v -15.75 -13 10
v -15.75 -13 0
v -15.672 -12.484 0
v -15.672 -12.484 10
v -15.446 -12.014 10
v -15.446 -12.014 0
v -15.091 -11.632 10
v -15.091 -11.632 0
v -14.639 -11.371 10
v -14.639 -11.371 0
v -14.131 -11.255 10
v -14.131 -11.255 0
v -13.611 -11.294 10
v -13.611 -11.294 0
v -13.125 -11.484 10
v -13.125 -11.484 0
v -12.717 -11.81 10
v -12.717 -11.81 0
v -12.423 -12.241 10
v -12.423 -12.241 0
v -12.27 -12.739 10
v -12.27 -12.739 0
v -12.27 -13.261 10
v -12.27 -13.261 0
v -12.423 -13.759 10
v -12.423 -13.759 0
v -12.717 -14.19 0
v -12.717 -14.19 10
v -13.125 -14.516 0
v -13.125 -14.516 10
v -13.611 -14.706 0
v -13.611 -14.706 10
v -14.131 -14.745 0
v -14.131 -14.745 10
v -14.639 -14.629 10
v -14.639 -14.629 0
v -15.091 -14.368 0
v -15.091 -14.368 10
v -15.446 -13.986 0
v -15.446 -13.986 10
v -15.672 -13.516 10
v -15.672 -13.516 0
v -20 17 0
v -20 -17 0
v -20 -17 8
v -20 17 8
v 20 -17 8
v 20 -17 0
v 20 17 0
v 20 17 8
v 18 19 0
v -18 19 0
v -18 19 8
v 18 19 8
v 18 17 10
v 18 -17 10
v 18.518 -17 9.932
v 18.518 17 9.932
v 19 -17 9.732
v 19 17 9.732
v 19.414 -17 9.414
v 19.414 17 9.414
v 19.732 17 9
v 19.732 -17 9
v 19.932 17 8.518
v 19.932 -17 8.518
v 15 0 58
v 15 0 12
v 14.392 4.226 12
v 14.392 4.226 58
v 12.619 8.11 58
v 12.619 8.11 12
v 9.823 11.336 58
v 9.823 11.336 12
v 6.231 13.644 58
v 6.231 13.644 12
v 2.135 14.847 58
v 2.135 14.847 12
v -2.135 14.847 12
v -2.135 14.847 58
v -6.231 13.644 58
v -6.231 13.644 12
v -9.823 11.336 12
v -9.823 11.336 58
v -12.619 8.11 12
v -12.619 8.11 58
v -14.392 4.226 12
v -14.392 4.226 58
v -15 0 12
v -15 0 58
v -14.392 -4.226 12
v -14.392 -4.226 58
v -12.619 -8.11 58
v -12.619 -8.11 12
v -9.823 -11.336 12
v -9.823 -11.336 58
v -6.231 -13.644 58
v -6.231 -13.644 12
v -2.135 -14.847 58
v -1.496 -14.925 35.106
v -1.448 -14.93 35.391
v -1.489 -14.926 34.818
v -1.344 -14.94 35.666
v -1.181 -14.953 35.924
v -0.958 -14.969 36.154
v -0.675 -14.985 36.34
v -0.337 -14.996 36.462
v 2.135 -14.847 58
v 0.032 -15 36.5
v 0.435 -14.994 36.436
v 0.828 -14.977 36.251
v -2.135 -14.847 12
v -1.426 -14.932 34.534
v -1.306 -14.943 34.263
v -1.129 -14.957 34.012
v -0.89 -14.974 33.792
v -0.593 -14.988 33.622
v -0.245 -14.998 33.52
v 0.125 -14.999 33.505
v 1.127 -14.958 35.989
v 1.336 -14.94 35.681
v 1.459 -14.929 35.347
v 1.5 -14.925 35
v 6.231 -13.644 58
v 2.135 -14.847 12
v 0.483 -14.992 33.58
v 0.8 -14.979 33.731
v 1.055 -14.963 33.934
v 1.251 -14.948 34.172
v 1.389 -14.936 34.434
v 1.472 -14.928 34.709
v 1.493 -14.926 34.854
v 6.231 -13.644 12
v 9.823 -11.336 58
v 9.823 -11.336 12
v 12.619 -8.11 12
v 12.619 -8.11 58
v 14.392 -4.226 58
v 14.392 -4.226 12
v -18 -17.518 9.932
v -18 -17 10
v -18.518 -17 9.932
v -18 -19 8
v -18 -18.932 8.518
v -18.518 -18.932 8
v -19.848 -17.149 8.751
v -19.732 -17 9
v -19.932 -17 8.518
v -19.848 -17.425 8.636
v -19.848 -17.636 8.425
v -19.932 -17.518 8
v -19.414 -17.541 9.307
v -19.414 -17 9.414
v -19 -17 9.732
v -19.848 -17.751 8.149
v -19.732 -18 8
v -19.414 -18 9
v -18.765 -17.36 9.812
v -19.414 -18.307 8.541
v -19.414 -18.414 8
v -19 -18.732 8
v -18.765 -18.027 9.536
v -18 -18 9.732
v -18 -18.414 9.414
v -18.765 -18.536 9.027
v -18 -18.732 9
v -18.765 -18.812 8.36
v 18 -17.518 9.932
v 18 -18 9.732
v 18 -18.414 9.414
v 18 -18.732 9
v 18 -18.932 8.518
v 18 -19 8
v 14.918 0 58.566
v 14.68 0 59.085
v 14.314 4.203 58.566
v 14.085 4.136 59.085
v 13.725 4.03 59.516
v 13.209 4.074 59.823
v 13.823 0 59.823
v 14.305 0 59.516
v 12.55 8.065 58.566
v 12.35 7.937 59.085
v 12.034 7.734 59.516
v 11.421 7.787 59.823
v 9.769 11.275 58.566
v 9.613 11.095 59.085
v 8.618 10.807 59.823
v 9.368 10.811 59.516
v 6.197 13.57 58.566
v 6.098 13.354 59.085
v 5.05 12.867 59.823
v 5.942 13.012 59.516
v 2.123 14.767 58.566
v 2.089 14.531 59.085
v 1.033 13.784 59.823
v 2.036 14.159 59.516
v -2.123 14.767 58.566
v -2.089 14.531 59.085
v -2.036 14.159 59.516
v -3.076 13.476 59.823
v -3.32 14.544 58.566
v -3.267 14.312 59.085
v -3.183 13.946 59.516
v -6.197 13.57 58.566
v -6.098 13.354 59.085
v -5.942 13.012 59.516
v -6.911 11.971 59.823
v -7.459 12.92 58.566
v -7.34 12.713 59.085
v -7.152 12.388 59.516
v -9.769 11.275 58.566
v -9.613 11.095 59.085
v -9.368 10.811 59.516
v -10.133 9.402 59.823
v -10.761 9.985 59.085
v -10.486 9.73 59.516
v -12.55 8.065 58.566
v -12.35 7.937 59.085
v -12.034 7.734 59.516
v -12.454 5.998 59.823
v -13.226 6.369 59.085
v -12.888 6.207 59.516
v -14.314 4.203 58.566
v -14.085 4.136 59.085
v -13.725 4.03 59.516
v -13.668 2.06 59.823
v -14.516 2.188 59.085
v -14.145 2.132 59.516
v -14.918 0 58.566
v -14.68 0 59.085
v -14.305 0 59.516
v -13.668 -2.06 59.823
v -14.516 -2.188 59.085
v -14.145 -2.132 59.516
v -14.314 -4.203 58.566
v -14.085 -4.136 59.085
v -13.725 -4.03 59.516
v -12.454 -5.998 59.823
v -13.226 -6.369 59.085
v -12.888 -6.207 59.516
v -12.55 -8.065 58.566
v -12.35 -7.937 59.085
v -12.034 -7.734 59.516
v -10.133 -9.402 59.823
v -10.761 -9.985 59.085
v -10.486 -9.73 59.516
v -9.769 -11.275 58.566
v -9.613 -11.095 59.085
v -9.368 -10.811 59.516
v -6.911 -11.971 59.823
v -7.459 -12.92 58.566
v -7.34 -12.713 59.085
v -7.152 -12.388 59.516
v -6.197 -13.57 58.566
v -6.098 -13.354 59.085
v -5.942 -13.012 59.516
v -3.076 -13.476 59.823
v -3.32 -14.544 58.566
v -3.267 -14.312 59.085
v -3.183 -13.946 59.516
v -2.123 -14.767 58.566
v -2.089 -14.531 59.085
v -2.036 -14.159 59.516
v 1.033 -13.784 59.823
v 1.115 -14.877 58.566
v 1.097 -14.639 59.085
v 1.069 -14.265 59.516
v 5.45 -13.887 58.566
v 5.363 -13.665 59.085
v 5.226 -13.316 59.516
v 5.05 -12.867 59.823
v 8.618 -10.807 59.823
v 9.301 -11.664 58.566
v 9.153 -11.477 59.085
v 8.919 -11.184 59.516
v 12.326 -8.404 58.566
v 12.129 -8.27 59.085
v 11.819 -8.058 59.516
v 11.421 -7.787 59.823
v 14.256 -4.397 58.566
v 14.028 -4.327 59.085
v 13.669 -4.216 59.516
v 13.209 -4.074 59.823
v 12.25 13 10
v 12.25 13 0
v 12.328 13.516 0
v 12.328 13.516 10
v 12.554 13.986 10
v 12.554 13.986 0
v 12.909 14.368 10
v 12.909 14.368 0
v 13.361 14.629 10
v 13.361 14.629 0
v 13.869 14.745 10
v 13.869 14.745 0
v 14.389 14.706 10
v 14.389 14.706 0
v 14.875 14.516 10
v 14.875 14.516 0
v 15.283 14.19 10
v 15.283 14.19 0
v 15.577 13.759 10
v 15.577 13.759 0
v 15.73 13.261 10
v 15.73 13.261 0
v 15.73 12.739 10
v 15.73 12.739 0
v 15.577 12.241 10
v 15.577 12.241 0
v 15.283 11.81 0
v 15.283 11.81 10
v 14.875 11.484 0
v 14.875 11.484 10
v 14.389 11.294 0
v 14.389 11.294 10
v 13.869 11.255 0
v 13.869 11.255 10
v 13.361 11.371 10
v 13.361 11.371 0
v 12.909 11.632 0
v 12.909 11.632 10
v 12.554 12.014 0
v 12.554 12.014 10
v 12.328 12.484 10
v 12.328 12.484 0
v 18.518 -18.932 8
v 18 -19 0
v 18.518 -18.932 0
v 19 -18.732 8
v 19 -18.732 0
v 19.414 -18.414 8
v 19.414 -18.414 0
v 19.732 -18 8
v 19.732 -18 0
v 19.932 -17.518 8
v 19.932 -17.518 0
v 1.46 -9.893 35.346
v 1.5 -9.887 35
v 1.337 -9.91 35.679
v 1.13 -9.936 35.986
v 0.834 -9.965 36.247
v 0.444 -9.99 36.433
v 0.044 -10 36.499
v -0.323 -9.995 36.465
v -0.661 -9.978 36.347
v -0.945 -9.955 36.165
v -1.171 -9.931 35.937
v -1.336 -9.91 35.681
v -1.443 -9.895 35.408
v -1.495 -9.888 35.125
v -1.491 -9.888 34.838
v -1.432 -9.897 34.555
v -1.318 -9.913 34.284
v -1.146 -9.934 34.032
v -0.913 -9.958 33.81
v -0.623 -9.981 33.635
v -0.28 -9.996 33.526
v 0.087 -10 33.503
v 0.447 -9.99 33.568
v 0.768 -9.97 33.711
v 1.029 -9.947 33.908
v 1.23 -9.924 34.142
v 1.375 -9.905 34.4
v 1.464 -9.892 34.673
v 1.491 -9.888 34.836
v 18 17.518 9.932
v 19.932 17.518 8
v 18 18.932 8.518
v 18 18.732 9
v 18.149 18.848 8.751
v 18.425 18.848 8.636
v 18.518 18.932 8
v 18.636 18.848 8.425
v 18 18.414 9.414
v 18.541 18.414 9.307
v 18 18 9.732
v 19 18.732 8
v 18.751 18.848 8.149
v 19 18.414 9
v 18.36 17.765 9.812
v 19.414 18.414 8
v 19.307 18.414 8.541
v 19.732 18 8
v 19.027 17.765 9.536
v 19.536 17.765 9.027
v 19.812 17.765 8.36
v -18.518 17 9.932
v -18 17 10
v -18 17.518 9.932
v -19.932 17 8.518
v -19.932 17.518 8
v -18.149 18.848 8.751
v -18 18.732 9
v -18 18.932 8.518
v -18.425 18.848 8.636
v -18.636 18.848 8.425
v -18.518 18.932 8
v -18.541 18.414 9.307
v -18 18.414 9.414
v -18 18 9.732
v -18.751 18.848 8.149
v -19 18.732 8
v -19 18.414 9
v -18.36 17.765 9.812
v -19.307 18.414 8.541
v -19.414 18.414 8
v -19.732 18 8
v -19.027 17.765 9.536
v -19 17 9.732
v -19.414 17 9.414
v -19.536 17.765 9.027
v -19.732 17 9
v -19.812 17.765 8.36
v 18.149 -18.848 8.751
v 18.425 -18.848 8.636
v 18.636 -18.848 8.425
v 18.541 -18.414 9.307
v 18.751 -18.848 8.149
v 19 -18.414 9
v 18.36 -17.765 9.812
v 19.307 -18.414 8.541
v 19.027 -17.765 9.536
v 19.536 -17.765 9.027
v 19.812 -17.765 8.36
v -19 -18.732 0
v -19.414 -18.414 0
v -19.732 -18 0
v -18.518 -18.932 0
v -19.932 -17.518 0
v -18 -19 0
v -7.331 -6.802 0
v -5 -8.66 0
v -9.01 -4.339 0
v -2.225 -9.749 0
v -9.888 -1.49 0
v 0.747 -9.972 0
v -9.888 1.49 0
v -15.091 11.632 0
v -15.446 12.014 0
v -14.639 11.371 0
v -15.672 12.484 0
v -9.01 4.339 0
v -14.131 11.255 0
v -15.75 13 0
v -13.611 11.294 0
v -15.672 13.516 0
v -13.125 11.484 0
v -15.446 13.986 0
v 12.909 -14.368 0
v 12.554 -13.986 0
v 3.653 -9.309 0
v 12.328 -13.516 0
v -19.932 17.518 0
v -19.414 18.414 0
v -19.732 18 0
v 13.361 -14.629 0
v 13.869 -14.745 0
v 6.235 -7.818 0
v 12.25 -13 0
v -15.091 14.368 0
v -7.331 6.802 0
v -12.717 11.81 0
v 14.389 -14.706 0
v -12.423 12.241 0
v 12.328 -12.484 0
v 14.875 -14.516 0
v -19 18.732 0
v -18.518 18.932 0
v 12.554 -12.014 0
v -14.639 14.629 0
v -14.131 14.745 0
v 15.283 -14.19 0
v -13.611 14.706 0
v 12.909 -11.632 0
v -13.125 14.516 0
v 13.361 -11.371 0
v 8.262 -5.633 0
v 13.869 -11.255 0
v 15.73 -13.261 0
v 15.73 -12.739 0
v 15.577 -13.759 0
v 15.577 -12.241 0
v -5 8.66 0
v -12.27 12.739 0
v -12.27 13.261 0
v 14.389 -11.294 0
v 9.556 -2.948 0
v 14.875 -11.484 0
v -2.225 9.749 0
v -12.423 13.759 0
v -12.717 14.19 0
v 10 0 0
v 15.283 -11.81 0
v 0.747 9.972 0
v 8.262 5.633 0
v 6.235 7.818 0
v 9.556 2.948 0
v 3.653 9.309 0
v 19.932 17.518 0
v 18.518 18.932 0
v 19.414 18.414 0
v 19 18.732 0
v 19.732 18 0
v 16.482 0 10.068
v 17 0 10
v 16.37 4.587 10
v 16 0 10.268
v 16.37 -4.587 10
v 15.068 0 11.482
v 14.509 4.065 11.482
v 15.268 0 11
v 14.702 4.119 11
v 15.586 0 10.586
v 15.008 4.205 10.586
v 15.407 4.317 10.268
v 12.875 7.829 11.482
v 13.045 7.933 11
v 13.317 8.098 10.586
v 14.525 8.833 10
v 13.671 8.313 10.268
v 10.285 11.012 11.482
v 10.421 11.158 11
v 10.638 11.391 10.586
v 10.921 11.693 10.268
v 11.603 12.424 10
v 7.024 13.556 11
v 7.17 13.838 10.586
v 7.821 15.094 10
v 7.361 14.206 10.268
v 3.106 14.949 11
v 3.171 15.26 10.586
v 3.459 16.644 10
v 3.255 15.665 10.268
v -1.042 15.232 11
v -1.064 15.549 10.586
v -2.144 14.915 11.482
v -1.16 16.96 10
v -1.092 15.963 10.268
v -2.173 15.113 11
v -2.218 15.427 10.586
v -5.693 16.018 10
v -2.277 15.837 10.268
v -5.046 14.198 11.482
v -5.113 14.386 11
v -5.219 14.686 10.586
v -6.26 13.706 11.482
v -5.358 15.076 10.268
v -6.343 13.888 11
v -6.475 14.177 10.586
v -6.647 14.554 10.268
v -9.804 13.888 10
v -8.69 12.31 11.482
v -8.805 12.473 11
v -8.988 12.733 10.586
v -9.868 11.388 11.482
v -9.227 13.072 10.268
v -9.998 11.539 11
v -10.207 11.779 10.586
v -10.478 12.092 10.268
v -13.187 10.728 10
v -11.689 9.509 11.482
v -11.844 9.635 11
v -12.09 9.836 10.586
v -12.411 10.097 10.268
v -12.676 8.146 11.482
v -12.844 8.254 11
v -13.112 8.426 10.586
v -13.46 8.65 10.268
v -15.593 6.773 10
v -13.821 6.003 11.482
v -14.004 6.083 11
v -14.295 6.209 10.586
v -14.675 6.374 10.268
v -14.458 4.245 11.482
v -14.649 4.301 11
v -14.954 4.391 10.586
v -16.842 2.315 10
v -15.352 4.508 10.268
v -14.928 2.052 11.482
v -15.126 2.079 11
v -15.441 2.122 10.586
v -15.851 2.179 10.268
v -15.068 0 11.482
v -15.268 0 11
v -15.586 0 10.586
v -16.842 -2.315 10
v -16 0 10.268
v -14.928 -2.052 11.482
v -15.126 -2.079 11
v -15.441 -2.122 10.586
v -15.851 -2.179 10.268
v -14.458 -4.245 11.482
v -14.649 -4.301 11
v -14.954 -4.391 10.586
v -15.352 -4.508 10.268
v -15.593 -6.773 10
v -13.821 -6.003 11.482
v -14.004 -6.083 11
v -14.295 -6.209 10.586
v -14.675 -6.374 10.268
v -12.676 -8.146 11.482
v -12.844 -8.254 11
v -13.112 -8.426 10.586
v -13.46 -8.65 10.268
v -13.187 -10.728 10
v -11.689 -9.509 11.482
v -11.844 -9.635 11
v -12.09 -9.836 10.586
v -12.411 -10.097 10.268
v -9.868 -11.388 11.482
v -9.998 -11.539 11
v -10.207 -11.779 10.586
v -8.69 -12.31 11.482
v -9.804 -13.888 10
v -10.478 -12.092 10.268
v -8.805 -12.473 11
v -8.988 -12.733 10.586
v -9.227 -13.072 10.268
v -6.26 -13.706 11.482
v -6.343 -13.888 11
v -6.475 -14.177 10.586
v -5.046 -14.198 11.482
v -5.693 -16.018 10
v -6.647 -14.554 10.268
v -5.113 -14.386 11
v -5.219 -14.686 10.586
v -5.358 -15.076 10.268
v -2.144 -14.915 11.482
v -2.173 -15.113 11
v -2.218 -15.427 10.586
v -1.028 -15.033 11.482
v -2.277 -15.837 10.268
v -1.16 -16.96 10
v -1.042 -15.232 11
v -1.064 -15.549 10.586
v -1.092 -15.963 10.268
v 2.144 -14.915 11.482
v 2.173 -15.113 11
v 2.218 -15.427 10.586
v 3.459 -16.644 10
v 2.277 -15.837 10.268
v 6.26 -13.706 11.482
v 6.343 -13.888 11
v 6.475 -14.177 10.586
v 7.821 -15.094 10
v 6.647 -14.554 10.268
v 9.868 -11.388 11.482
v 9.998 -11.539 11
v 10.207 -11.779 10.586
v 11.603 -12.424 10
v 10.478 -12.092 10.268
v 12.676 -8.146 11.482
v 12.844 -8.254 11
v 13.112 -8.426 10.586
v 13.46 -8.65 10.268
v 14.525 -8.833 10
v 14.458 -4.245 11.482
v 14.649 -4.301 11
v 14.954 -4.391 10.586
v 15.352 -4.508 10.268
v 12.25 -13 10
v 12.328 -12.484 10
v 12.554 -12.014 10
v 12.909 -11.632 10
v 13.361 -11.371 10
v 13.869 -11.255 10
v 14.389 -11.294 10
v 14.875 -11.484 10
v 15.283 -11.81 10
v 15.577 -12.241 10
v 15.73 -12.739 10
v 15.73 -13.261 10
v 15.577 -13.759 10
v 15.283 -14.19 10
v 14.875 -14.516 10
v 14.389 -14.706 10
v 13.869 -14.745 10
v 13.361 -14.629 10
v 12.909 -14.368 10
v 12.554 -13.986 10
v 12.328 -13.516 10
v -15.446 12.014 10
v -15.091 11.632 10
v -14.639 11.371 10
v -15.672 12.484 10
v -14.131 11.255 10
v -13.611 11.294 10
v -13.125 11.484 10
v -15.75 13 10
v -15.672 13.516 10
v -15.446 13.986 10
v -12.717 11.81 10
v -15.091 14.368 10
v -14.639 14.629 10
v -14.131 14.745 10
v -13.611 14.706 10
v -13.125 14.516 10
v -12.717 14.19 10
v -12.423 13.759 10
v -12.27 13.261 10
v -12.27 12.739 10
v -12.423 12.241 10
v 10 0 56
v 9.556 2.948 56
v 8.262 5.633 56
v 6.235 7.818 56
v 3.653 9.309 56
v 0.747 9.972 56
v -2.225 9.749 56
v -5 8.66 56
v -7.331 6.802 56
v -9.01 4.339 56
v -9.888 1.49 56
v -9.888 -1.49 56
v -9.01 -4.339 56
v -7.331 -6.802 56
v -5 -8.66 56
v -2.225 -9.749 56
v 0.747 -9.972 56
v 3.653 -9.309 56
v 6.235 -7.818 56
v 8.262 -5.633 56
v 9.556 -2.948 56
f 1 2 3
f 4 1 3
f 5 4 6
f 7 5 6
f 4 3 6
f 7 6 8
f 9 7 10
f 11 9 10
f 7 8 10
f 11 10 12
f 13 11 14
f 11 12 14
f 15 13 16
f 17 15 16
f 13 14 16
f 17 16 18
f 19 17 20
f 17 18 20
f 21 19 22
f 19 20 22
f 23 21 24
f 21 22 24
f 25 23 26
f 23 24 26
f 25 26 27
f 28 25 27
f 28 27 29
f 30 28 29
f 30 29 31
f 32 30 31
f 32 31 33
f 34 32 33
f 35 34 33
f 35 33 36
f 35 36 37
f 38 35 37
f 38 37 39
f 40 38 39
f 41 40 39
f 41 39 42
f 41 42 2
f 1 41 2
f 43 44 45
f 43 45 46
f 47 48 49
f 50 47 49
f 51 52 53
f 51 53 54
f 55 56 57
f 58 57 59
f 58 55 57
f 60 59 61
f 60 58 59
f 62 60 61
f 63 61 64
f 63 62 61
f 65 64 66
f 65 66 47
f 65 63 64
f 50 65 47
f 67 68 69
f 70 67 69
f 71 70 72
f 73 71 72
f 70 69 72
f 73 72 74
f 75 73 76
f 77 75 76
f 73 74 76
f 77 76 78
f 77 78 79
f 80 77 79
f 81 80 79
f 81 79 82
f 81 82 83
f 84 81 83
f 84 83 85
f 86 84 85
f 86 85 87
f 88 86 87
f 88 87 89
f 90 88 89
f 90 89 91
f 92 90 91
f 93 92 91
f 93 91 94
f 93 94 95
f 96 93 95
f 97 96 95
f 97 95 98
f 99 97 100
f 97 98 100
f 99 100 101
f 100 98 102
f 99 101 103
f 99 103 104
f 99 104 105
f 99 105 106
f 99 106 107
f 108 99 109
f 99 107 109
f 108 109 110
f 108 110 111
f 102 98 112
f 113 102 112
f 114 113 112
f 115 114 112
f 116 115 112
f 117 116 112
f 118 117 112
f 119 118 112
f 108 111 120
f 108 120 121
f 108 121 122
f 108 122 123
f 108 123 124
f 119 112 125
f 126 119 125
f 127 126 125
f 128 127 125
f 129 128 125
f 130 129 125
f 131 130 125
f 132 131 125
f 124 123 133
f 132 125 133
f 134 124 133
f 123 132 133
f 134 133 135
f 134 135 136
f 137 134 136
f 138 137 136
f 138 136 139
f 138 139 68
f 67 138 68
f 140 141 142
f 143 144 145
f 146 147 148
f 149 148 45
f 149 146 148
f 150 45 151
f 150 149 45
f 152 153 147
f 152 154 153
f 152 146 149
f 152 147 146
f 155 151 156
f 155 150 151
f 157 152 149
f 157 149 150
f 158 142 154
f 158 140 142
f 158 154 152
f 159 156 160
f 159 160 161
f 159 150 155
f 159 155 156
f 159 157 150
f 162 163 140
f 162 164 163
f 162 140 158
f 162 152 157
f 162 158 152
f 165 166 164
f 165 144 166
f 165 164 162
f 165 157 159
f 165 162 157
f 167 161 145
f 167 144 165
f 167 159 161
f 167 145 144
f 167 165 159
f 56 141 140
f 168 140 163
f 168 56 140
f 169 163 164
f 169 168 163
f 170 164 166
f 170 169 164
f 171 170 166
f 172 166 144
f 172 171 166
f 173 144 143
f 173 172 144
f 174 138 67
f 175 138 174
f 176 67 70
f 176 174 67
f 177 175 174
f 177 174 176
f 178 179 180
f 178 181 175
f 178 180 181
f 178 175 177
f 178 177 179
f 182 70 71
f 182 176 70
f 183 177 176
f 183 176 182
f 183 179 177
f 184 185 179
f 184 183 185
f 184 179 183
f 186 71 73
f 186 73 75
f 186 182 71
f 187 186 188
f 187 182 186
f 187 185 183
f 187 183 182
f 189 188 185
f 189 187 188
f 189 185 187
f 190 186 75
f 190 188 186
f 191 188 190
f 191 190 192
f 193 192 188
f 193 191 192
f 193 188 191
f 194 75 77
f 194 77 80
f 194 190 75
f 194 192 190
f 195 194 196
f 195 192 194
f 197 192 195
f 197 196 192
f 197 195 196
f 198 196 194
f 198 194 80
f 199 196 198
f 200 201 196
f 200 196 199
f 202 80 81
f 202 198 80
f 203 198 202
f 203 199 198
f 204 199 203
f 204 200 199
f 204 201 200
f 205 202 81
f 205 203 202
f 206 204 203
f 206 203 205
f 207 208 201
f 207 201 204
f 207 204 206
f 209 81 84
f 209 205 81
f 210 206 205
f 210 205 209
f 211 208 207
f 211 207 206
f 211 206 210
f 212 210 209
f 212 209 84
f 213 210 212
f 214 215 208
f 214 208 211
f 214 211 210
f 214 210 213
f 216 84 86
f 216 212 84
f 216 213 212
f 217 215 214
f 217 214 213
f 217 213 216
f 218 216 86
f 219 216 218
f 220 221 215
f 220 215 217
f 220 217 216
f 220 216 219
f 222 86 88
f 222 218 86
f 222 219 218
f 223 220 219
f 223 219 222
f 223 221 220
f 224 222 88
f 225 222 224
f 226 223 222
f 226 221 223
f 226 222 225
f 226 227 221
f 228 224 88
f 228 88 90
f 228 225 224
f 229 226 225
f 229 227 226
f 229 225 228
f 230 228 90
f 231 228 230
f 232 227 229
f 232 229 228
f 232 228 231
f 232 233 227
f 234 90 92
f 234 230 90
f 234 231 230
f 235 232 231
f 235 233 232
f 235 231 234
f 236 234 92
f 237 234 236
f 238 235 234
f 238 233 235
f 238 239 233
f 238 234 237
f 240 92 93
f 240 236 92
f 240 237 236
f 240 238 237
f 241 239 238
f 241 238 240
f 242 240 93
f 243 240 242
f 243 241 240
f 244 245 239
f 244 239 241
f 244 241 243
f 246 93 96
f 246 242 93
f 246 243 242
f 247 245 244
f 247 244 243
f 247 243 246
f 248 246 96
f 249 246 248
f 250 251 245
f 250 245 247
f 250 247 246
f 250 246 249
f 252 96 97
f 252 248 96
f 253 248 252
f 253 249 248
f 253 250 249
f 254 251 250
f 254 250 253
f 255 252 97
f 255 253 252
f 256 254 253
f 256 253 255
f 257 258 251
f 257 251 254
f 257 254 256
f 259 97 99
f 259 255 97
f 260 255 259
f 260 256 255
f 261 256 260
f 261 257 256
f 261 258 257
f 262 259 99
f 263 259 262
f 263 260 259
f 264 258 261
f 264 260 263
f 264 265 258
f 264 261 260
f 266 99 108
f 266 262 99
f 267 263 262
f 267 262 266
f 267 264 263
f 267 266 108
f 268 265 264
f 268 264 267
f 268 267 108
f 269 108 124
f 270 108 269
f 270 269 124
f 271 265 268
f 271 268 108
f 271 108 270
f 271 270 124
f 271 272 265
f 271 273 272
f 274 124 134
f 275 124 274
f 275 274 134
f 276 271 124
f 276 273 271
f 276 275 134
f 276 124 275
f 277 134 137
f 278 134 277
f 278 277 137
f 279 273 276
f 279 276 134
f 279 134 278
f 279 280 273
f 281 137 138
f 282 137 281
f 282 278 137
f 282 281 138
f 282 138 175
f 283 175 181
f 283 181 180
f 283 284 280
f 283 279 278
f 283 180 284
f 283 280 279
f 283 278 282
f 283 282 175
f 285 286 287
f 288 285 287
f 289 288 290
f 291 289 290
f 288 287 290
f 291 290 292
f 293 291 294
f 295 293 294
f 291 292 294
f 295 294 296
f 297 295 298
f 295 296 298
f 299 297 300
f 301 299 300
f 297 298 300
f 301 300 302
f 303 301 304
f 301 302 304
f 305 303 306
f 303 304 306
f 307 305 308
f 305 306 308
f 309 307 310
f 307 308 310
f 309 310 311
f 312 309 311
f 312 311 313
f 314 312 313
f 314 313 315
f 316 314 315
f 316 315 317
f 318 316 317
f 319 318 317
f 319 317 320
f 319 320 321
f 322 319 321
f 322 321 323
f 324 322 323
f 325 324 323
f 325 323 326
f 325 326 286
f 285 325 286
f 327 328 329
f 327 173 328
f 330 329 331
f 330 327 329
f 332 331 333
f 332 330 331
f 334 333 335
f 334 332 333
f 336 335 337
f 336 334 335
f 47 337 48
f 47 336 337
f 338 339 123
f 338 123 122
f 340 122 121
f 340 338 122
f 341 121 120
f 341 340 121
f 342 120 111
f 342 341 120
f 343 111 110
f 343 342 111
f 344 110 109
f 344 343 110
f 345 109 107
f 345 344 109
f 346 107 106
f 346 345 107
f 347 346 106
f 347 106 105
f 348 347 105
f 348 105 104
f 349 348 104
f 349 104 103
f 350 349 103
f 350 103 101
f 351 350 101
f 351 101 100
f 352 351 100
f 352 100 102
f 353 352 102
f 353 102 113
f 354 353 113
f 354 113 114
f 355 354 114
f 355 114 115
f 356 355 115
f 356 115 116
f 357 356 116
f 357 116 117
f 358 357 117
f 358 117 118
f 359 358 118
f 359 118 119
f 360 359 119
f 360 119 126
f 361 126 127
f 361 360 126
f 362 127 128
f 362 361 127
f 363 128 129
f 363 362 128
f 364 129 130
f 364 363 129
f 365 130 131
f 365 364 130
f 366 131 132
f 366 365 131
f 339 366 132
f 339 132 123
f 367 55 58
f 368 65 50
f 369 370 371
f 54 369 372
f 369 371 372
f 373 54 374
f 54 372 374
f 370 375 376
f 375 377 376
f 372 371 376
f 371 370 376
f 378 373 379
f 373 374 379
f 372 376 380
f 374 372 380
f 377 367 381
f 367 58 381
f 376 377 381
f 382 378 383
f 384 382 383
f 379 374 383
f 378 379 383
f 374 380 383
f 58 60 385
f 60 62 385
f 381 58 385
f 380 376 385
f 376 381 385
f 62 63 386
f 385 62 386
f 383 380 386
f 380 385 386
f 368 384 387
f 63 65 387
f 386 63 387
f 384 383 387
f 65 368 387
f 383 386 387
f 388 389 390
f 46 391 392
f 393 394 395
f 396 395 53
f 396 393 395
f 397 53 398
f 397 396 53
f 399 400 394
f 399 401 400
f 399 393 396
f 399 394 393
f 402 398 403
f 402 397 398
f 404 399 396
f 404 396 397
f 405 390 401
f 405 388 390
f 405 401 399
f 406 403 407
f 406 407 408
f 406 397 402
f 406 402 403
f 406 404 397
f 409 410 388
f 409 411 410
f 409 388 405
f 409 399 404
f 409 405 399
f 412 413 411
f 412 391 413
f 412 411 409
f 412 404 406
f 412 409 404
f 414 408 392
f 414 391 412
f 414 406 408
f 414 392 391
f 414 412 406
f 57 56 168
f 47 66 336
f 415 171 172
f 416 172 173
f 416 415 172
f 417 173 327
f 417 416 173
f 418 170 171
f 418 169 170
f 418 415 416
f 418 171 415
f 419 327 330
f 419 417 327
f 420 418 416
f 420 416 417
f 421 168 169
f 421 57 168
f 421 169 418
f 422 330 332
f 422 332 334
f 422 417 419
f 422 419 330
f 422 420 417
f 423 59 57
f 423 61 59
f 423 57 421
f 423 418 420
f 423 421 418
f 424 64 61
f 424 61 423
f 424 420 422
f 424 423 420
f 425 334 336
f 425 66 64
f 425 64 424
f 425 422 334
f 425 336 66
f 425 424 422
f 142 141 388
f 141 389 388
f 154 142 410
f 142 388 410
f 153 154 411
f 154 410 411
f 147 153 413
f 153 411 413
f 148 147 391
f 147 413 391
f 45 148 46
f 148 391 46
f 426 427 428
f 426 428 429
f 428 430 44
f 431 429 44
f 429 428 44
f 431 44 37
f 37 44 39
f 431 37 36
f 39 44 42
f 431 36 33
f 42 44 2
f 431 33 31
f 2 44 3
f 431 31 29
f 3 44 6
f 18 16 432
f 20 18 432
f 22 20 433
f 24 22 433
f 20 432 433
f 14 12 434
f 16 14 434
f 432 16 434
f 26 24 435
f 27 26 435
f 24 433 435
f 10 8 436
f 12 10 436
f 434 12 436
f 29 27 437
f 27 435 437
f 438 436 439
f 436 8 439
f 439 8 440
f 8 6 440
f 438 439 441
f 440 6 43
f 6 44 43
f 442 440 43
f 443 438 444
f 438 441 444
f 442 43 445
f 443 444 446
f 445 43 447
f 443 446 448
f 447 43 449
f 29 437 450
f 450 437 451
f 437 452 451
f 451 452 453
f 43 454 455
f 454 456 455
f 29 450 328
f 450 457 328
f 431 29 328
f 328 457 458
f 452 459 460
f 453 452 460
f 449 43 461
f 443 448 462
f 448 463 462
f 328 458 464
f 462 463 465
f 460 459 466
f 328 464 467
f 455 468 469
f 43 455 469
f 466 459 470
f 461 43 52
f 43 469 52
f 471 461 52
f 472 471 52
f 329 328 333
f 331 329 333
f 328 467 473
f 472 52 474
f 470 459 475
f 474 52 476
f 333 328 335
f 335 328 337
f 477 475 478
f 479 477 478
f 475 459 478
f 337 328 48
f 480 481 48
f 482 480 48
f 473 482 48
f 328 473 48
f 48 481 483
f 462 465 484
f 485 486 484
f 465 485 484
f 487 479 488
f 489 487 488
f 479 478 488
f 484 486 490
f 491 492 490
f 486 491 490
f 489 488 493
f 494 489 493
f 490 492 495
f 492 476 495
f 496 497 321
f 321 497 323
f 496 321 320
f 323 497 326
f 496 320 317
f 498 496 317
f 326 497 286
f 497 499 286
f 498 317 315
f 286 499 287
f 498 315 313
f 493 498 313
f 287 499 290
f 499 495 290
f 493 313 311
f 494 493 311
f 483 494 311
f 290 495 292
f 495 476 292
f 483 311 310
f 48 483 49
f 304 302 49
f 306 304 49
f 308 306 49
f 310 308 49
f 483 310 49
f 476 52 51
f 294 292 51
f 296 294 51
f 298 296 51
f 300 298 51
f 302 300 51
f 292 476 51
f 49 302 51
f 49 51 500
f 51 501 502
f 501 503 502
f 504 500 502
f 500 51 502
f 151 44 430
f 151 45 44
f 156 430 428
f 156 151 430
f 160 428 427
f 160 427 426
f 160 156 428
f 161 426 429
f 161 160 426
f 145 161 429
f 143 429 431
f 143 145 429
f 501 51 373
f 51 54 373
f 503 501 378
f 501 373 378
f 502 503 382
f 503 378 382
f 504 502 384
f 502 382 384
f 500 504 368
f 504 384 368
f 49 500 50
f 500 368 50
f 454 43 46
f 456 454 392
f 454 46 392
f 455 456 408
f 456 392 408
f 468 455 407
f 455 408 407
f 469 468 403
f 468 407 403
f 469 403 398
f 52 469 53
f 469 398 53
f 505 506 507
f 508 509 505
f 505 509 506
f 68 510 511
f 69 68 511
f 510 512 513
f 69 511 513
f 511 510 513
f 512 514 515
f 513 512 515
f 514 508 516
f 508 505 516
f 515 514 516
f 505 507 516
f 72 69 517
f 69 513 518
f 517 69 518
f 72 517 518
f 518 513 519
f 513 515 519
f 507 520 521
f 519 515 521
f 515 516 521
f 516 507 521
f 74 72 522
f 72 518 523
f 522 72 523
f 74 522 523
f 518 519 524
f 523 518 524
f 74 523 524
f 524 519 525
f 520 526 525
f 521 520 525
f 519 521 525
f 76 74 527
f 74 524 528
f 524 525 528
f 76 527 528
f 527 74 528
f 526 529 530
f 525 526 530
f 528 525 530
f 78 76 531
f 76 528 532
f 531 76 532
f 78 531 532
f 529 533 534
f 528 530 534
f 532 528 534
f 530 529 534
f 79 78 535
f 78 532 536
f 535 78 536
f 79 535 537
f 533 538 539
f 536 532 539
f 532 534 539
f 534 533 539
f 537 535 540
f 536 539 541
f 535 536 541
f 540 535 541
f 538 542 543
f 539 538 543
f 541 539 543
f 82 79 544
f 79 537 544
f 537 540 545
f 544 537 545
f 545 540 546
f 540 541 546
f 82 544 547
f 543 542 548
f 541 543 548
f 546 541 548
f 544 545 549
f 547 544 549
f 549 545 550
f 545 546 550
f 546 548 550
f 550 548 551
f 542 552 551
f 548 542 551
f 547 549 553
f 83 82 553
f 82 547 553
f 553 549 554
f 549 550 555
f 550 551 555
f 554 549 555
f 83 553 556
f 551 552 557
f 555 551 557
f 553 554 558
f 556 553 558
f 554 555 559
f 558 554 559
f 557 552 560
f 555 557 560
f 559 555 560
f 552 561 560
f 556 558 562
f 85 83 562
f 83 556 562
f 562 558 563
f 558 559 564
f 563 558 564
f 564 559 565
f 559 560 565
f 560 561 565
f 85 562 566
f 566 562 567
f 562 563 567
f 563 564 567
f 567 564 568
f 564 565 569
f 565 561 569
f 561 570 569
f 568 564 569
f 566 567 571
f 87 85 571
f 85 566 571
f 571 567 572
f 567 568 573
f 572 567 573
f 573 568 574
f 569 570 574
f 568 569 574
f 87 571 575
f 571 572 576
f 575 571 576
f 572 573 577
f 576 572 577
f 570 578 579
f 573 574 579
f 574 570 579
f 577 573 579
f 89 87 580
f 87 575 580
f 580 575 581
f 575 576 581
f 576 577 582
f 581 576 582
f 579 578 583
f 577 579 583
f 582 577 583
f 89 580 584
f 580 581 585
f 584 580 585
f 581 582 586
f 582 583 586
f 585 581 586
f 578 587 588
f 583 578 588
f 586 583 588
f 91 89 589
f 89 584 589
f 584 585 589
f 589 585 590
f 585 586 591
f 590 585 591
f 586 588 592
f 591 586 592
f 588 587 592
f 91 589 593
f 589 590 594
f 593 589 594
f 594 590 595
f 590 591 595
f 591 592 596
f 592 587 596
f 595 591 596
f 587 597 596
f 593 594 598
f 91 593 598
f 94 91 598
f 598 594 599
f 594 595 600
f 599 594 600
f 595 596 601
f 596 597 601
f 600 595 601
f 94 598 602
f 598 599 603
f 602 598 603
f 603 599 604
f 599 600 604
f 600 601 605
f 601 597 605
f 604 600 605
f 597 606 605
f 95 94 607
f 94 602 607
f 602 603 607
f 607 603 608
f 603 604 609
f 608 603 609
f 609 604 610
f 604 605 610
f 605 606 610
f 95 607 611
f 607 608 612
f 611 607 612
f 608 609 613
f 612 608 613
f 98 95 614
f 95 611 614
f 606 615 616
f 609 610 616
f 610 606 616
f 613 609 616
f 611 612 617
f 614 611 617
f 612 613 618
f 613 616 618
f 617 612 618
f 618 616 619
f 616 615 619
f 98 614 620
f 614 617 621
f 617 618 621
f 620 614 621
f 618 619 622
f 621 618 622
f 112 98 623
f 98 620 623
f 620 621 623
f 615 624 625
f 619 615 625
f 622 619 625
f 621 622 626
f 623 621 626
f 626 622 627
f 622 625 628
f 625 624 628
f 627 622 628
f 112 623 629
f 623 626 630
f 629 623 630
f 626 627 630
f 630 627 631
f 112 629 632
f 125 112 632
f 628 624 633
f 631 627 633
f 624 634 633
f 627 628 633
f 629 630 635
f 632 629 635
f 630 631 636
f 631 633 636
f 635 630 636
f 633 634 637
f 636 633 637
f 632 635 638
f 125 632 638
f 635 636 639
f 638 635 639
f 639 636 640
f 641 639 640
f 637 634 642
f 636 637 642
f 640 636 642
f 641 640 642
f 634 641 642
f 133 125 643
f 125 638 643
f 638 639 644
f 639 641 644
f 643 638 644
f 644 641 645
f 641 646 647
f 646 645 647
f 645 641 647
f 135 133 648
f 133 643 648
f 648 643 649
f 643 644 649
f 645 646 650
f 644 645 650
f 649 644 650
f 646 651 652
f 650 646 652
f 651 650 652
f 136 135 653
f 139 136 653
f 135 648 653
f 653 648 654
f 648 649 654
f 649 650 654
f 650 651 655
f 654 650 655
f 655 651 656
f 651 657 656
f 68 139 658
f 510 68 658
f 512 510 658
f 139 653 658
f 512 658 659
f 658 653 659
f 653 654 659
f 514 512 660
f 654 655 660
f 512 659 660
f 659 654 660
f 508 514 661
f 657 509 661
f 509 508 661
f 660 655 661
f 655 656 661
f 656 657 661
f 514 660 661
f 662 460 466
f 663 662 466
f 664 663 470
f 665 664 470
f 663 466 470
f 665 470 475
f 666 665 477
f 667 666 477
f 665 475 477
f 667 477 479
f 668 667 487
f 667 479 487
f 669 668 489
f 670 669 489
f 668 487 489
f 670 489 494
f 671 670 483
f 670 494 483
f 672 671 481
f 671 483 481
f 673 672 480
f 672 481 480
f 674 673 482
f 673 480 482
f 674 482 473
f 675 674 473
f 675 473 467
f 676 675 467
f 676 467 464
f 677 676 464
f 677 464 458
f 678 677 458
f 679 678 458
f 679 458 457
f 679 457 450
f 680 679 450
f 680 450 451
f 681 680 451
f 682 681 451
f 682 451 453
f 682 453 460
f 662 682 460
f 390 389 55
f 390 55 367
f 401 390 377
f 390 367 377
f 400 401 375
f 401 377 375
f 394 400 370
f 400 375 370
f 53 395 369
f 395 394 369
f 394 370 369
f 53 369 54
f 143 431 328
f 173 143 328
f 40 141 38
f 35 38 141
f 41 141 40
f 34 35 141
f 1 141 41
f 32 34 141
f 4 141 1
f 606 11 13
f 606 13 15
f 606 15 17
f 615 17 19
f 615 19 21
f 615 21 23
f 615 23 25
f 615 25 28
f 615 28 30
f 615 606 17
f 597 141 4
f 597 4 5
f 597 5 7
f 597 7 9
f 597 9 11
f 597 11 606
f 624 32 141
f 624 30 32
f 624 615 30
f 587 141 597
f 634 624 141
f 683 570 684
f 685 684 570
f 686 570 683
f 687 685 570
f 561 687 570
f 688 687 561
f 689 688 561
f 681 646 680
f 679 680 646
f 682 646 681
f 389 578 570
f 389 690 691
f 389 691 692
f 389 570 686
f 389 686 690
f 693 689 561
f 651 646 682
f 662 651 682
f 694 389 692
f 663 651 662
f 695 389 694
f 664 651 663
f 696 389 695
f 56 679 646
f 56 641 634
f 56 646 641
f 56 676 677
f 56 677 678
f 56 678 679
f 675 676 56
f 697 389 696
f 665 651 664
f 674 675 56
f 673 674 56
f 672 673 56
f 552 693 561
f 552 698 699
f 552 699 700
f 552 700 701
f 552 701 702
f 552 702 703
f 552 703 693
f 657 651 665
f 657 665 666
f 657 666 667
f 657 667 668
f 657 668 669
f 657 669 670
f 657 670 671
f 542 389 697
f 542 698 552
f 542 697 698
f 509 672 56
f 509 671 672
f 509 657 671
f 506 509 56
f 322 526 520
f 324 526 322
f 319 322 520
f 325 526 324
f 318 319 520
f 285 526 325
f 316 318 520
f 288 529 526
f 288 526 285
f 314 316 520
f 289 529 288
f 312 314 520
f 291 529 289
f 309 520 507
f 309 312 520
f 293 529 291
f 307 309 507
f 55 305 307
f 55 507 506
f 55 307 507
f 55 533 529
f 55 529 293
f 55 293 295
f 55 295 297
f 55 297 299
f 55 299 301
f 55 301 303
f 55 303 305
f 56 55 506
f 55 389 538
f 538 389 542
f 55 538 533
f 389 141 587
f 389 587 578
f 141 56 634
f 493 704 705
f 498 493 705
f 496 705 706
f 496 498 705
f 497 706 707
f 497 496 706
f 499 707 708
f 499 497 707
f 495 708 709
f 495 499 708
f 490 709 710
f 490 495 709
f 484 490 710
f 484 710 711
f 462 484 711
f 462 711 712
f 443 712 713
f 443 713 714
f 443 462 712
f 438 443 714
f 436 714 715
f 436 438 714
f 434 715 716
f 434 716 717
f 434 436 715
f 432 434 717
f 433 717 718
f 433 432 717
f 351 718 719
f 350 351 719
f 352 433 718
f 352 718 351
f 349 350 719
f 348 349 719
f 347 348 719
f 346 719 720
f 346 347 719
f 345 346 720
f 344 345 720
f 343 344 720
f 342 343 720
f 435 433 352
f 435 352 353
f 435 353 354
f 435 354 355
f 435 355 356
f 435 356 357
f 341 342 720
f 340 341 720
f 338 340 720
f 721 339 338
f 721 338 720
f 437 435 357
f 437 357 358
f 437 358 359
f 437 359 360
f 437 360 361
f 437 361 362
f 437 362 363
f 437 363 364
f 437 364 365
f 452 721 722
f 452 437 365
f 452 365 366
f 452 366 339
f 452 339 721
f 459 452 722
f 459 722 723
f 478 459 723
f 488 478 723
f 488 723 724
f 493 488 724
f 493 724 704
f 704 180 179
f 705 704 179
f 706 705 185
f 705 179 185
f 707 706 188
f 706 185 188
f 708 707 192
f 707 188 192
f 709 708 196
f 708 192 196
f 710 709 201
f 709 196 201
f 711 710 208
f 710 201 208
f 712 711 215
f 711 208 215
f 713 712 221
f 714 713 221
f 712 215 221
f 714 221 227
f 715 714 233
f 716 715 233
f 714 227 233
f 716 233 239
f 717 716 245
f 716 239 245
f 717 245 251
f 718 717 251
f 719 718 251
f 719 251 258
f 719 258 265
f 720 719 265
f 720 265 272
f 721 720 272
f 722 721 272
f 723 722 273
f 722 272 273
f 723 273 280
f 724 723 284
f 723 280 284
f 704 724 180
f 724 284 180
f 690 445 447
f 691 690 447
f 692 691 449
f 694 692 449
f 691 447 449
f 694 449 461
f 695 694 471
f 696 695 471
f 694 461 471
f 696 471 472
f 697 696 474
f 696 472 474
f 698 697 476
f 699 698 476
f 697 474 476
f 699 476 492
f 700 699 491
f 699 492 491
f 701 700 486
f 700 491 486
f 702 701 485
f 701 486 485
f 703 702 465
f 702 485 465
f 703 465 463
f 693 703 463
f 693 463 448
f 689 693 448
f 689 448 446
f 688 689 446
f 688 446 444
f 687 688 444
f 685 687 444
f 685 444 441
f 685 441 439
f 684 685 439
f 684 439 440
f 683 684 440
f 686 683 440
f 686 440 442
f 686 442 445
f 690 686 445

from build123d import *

# Parameters (mm, degrees)
F0_W     = 40
F0_H     = 38
F0_R     = 10
F1_DEPTH = 10
F4_D     = 3.5
F2_R     = 15
F2_R_2   = 10
F5_DEPTH = 50
F6_R     = 1.5
F7_DEPTH = 25
F8_R     = 1.99999


# Not quite as in the source:
# - a fillet or chamfer that OpenCascade refuses, or shapes differently, is made with other operations: its cross-section is extruded or revolved along the edge and cut away or added
# - a fillet or chamfer is up to 0.001 mm smaller than in the source, because OpenCascade refuses the exact size


with BuildPart() as f1:
    # F0 (on Top) → F1 (new body)
    with BuildSketch(Plane.XY):
        Rectangle(F0_W, F0_H)
        Circle(F0_R, mode=Mode.SUBTRACT)
    extrude(amount=F1_DEPTH)

    # F4 (through all)
    with Locations(Plane.XY.offset(10)):
        with Locations((-14, 13), (-14, -13), (14, -13), (14, 13)):
            Hole(F4_D / 2)

    # F2 (on face) → F5 (join)
    with BuildSketch(Plane.XY.offset(10)):
        Circle(F2_R)
        Circle(F2_R_2, mode=Mode.SUBTRACT)
    extrude(amount=F5_DEPTH)

    # F6 (on Front) → F7 (cut)
    with BuildSketch(Plane.XZ):
        with Locations((0, 35)):
            Circle(F6_R)
    extrude(amount=F7_DEPTH, mode=Mode.SUBTRACT)

    # F8 (radius 2 in the source; OpenCascade refuses exactly that, so slightly less here)
    f8_edges = [f1.edges().sort_by_distance(p)[0] for p in [
        (-15, 0, 10),
        (20, 0, 10),
        (0, -19, 10),
        (-20, 0, 10),
        (0, 19, 10),
        (20, 19, 5),
        (-20, -19, 5),
        (20, -19, 5),
        (-15, 0, 60),
        (-20, 19, 5),
    ]]
    fillet(f8_edges, radius=F8_R)

    # F9: chamfer of 4 on 1 edges, made by hand

    # F9_s1 → F9_t2 (revolve, cut)
    with BuildSketch(Plane.XZ):
        Polygon((10, 56), (14, 60), (10, 60), align=None)
    revolve(axis=Axis((0, 0, 60), (0, 0, 1)), mode=Mode.SUBTRACT)


solid = f1.part
